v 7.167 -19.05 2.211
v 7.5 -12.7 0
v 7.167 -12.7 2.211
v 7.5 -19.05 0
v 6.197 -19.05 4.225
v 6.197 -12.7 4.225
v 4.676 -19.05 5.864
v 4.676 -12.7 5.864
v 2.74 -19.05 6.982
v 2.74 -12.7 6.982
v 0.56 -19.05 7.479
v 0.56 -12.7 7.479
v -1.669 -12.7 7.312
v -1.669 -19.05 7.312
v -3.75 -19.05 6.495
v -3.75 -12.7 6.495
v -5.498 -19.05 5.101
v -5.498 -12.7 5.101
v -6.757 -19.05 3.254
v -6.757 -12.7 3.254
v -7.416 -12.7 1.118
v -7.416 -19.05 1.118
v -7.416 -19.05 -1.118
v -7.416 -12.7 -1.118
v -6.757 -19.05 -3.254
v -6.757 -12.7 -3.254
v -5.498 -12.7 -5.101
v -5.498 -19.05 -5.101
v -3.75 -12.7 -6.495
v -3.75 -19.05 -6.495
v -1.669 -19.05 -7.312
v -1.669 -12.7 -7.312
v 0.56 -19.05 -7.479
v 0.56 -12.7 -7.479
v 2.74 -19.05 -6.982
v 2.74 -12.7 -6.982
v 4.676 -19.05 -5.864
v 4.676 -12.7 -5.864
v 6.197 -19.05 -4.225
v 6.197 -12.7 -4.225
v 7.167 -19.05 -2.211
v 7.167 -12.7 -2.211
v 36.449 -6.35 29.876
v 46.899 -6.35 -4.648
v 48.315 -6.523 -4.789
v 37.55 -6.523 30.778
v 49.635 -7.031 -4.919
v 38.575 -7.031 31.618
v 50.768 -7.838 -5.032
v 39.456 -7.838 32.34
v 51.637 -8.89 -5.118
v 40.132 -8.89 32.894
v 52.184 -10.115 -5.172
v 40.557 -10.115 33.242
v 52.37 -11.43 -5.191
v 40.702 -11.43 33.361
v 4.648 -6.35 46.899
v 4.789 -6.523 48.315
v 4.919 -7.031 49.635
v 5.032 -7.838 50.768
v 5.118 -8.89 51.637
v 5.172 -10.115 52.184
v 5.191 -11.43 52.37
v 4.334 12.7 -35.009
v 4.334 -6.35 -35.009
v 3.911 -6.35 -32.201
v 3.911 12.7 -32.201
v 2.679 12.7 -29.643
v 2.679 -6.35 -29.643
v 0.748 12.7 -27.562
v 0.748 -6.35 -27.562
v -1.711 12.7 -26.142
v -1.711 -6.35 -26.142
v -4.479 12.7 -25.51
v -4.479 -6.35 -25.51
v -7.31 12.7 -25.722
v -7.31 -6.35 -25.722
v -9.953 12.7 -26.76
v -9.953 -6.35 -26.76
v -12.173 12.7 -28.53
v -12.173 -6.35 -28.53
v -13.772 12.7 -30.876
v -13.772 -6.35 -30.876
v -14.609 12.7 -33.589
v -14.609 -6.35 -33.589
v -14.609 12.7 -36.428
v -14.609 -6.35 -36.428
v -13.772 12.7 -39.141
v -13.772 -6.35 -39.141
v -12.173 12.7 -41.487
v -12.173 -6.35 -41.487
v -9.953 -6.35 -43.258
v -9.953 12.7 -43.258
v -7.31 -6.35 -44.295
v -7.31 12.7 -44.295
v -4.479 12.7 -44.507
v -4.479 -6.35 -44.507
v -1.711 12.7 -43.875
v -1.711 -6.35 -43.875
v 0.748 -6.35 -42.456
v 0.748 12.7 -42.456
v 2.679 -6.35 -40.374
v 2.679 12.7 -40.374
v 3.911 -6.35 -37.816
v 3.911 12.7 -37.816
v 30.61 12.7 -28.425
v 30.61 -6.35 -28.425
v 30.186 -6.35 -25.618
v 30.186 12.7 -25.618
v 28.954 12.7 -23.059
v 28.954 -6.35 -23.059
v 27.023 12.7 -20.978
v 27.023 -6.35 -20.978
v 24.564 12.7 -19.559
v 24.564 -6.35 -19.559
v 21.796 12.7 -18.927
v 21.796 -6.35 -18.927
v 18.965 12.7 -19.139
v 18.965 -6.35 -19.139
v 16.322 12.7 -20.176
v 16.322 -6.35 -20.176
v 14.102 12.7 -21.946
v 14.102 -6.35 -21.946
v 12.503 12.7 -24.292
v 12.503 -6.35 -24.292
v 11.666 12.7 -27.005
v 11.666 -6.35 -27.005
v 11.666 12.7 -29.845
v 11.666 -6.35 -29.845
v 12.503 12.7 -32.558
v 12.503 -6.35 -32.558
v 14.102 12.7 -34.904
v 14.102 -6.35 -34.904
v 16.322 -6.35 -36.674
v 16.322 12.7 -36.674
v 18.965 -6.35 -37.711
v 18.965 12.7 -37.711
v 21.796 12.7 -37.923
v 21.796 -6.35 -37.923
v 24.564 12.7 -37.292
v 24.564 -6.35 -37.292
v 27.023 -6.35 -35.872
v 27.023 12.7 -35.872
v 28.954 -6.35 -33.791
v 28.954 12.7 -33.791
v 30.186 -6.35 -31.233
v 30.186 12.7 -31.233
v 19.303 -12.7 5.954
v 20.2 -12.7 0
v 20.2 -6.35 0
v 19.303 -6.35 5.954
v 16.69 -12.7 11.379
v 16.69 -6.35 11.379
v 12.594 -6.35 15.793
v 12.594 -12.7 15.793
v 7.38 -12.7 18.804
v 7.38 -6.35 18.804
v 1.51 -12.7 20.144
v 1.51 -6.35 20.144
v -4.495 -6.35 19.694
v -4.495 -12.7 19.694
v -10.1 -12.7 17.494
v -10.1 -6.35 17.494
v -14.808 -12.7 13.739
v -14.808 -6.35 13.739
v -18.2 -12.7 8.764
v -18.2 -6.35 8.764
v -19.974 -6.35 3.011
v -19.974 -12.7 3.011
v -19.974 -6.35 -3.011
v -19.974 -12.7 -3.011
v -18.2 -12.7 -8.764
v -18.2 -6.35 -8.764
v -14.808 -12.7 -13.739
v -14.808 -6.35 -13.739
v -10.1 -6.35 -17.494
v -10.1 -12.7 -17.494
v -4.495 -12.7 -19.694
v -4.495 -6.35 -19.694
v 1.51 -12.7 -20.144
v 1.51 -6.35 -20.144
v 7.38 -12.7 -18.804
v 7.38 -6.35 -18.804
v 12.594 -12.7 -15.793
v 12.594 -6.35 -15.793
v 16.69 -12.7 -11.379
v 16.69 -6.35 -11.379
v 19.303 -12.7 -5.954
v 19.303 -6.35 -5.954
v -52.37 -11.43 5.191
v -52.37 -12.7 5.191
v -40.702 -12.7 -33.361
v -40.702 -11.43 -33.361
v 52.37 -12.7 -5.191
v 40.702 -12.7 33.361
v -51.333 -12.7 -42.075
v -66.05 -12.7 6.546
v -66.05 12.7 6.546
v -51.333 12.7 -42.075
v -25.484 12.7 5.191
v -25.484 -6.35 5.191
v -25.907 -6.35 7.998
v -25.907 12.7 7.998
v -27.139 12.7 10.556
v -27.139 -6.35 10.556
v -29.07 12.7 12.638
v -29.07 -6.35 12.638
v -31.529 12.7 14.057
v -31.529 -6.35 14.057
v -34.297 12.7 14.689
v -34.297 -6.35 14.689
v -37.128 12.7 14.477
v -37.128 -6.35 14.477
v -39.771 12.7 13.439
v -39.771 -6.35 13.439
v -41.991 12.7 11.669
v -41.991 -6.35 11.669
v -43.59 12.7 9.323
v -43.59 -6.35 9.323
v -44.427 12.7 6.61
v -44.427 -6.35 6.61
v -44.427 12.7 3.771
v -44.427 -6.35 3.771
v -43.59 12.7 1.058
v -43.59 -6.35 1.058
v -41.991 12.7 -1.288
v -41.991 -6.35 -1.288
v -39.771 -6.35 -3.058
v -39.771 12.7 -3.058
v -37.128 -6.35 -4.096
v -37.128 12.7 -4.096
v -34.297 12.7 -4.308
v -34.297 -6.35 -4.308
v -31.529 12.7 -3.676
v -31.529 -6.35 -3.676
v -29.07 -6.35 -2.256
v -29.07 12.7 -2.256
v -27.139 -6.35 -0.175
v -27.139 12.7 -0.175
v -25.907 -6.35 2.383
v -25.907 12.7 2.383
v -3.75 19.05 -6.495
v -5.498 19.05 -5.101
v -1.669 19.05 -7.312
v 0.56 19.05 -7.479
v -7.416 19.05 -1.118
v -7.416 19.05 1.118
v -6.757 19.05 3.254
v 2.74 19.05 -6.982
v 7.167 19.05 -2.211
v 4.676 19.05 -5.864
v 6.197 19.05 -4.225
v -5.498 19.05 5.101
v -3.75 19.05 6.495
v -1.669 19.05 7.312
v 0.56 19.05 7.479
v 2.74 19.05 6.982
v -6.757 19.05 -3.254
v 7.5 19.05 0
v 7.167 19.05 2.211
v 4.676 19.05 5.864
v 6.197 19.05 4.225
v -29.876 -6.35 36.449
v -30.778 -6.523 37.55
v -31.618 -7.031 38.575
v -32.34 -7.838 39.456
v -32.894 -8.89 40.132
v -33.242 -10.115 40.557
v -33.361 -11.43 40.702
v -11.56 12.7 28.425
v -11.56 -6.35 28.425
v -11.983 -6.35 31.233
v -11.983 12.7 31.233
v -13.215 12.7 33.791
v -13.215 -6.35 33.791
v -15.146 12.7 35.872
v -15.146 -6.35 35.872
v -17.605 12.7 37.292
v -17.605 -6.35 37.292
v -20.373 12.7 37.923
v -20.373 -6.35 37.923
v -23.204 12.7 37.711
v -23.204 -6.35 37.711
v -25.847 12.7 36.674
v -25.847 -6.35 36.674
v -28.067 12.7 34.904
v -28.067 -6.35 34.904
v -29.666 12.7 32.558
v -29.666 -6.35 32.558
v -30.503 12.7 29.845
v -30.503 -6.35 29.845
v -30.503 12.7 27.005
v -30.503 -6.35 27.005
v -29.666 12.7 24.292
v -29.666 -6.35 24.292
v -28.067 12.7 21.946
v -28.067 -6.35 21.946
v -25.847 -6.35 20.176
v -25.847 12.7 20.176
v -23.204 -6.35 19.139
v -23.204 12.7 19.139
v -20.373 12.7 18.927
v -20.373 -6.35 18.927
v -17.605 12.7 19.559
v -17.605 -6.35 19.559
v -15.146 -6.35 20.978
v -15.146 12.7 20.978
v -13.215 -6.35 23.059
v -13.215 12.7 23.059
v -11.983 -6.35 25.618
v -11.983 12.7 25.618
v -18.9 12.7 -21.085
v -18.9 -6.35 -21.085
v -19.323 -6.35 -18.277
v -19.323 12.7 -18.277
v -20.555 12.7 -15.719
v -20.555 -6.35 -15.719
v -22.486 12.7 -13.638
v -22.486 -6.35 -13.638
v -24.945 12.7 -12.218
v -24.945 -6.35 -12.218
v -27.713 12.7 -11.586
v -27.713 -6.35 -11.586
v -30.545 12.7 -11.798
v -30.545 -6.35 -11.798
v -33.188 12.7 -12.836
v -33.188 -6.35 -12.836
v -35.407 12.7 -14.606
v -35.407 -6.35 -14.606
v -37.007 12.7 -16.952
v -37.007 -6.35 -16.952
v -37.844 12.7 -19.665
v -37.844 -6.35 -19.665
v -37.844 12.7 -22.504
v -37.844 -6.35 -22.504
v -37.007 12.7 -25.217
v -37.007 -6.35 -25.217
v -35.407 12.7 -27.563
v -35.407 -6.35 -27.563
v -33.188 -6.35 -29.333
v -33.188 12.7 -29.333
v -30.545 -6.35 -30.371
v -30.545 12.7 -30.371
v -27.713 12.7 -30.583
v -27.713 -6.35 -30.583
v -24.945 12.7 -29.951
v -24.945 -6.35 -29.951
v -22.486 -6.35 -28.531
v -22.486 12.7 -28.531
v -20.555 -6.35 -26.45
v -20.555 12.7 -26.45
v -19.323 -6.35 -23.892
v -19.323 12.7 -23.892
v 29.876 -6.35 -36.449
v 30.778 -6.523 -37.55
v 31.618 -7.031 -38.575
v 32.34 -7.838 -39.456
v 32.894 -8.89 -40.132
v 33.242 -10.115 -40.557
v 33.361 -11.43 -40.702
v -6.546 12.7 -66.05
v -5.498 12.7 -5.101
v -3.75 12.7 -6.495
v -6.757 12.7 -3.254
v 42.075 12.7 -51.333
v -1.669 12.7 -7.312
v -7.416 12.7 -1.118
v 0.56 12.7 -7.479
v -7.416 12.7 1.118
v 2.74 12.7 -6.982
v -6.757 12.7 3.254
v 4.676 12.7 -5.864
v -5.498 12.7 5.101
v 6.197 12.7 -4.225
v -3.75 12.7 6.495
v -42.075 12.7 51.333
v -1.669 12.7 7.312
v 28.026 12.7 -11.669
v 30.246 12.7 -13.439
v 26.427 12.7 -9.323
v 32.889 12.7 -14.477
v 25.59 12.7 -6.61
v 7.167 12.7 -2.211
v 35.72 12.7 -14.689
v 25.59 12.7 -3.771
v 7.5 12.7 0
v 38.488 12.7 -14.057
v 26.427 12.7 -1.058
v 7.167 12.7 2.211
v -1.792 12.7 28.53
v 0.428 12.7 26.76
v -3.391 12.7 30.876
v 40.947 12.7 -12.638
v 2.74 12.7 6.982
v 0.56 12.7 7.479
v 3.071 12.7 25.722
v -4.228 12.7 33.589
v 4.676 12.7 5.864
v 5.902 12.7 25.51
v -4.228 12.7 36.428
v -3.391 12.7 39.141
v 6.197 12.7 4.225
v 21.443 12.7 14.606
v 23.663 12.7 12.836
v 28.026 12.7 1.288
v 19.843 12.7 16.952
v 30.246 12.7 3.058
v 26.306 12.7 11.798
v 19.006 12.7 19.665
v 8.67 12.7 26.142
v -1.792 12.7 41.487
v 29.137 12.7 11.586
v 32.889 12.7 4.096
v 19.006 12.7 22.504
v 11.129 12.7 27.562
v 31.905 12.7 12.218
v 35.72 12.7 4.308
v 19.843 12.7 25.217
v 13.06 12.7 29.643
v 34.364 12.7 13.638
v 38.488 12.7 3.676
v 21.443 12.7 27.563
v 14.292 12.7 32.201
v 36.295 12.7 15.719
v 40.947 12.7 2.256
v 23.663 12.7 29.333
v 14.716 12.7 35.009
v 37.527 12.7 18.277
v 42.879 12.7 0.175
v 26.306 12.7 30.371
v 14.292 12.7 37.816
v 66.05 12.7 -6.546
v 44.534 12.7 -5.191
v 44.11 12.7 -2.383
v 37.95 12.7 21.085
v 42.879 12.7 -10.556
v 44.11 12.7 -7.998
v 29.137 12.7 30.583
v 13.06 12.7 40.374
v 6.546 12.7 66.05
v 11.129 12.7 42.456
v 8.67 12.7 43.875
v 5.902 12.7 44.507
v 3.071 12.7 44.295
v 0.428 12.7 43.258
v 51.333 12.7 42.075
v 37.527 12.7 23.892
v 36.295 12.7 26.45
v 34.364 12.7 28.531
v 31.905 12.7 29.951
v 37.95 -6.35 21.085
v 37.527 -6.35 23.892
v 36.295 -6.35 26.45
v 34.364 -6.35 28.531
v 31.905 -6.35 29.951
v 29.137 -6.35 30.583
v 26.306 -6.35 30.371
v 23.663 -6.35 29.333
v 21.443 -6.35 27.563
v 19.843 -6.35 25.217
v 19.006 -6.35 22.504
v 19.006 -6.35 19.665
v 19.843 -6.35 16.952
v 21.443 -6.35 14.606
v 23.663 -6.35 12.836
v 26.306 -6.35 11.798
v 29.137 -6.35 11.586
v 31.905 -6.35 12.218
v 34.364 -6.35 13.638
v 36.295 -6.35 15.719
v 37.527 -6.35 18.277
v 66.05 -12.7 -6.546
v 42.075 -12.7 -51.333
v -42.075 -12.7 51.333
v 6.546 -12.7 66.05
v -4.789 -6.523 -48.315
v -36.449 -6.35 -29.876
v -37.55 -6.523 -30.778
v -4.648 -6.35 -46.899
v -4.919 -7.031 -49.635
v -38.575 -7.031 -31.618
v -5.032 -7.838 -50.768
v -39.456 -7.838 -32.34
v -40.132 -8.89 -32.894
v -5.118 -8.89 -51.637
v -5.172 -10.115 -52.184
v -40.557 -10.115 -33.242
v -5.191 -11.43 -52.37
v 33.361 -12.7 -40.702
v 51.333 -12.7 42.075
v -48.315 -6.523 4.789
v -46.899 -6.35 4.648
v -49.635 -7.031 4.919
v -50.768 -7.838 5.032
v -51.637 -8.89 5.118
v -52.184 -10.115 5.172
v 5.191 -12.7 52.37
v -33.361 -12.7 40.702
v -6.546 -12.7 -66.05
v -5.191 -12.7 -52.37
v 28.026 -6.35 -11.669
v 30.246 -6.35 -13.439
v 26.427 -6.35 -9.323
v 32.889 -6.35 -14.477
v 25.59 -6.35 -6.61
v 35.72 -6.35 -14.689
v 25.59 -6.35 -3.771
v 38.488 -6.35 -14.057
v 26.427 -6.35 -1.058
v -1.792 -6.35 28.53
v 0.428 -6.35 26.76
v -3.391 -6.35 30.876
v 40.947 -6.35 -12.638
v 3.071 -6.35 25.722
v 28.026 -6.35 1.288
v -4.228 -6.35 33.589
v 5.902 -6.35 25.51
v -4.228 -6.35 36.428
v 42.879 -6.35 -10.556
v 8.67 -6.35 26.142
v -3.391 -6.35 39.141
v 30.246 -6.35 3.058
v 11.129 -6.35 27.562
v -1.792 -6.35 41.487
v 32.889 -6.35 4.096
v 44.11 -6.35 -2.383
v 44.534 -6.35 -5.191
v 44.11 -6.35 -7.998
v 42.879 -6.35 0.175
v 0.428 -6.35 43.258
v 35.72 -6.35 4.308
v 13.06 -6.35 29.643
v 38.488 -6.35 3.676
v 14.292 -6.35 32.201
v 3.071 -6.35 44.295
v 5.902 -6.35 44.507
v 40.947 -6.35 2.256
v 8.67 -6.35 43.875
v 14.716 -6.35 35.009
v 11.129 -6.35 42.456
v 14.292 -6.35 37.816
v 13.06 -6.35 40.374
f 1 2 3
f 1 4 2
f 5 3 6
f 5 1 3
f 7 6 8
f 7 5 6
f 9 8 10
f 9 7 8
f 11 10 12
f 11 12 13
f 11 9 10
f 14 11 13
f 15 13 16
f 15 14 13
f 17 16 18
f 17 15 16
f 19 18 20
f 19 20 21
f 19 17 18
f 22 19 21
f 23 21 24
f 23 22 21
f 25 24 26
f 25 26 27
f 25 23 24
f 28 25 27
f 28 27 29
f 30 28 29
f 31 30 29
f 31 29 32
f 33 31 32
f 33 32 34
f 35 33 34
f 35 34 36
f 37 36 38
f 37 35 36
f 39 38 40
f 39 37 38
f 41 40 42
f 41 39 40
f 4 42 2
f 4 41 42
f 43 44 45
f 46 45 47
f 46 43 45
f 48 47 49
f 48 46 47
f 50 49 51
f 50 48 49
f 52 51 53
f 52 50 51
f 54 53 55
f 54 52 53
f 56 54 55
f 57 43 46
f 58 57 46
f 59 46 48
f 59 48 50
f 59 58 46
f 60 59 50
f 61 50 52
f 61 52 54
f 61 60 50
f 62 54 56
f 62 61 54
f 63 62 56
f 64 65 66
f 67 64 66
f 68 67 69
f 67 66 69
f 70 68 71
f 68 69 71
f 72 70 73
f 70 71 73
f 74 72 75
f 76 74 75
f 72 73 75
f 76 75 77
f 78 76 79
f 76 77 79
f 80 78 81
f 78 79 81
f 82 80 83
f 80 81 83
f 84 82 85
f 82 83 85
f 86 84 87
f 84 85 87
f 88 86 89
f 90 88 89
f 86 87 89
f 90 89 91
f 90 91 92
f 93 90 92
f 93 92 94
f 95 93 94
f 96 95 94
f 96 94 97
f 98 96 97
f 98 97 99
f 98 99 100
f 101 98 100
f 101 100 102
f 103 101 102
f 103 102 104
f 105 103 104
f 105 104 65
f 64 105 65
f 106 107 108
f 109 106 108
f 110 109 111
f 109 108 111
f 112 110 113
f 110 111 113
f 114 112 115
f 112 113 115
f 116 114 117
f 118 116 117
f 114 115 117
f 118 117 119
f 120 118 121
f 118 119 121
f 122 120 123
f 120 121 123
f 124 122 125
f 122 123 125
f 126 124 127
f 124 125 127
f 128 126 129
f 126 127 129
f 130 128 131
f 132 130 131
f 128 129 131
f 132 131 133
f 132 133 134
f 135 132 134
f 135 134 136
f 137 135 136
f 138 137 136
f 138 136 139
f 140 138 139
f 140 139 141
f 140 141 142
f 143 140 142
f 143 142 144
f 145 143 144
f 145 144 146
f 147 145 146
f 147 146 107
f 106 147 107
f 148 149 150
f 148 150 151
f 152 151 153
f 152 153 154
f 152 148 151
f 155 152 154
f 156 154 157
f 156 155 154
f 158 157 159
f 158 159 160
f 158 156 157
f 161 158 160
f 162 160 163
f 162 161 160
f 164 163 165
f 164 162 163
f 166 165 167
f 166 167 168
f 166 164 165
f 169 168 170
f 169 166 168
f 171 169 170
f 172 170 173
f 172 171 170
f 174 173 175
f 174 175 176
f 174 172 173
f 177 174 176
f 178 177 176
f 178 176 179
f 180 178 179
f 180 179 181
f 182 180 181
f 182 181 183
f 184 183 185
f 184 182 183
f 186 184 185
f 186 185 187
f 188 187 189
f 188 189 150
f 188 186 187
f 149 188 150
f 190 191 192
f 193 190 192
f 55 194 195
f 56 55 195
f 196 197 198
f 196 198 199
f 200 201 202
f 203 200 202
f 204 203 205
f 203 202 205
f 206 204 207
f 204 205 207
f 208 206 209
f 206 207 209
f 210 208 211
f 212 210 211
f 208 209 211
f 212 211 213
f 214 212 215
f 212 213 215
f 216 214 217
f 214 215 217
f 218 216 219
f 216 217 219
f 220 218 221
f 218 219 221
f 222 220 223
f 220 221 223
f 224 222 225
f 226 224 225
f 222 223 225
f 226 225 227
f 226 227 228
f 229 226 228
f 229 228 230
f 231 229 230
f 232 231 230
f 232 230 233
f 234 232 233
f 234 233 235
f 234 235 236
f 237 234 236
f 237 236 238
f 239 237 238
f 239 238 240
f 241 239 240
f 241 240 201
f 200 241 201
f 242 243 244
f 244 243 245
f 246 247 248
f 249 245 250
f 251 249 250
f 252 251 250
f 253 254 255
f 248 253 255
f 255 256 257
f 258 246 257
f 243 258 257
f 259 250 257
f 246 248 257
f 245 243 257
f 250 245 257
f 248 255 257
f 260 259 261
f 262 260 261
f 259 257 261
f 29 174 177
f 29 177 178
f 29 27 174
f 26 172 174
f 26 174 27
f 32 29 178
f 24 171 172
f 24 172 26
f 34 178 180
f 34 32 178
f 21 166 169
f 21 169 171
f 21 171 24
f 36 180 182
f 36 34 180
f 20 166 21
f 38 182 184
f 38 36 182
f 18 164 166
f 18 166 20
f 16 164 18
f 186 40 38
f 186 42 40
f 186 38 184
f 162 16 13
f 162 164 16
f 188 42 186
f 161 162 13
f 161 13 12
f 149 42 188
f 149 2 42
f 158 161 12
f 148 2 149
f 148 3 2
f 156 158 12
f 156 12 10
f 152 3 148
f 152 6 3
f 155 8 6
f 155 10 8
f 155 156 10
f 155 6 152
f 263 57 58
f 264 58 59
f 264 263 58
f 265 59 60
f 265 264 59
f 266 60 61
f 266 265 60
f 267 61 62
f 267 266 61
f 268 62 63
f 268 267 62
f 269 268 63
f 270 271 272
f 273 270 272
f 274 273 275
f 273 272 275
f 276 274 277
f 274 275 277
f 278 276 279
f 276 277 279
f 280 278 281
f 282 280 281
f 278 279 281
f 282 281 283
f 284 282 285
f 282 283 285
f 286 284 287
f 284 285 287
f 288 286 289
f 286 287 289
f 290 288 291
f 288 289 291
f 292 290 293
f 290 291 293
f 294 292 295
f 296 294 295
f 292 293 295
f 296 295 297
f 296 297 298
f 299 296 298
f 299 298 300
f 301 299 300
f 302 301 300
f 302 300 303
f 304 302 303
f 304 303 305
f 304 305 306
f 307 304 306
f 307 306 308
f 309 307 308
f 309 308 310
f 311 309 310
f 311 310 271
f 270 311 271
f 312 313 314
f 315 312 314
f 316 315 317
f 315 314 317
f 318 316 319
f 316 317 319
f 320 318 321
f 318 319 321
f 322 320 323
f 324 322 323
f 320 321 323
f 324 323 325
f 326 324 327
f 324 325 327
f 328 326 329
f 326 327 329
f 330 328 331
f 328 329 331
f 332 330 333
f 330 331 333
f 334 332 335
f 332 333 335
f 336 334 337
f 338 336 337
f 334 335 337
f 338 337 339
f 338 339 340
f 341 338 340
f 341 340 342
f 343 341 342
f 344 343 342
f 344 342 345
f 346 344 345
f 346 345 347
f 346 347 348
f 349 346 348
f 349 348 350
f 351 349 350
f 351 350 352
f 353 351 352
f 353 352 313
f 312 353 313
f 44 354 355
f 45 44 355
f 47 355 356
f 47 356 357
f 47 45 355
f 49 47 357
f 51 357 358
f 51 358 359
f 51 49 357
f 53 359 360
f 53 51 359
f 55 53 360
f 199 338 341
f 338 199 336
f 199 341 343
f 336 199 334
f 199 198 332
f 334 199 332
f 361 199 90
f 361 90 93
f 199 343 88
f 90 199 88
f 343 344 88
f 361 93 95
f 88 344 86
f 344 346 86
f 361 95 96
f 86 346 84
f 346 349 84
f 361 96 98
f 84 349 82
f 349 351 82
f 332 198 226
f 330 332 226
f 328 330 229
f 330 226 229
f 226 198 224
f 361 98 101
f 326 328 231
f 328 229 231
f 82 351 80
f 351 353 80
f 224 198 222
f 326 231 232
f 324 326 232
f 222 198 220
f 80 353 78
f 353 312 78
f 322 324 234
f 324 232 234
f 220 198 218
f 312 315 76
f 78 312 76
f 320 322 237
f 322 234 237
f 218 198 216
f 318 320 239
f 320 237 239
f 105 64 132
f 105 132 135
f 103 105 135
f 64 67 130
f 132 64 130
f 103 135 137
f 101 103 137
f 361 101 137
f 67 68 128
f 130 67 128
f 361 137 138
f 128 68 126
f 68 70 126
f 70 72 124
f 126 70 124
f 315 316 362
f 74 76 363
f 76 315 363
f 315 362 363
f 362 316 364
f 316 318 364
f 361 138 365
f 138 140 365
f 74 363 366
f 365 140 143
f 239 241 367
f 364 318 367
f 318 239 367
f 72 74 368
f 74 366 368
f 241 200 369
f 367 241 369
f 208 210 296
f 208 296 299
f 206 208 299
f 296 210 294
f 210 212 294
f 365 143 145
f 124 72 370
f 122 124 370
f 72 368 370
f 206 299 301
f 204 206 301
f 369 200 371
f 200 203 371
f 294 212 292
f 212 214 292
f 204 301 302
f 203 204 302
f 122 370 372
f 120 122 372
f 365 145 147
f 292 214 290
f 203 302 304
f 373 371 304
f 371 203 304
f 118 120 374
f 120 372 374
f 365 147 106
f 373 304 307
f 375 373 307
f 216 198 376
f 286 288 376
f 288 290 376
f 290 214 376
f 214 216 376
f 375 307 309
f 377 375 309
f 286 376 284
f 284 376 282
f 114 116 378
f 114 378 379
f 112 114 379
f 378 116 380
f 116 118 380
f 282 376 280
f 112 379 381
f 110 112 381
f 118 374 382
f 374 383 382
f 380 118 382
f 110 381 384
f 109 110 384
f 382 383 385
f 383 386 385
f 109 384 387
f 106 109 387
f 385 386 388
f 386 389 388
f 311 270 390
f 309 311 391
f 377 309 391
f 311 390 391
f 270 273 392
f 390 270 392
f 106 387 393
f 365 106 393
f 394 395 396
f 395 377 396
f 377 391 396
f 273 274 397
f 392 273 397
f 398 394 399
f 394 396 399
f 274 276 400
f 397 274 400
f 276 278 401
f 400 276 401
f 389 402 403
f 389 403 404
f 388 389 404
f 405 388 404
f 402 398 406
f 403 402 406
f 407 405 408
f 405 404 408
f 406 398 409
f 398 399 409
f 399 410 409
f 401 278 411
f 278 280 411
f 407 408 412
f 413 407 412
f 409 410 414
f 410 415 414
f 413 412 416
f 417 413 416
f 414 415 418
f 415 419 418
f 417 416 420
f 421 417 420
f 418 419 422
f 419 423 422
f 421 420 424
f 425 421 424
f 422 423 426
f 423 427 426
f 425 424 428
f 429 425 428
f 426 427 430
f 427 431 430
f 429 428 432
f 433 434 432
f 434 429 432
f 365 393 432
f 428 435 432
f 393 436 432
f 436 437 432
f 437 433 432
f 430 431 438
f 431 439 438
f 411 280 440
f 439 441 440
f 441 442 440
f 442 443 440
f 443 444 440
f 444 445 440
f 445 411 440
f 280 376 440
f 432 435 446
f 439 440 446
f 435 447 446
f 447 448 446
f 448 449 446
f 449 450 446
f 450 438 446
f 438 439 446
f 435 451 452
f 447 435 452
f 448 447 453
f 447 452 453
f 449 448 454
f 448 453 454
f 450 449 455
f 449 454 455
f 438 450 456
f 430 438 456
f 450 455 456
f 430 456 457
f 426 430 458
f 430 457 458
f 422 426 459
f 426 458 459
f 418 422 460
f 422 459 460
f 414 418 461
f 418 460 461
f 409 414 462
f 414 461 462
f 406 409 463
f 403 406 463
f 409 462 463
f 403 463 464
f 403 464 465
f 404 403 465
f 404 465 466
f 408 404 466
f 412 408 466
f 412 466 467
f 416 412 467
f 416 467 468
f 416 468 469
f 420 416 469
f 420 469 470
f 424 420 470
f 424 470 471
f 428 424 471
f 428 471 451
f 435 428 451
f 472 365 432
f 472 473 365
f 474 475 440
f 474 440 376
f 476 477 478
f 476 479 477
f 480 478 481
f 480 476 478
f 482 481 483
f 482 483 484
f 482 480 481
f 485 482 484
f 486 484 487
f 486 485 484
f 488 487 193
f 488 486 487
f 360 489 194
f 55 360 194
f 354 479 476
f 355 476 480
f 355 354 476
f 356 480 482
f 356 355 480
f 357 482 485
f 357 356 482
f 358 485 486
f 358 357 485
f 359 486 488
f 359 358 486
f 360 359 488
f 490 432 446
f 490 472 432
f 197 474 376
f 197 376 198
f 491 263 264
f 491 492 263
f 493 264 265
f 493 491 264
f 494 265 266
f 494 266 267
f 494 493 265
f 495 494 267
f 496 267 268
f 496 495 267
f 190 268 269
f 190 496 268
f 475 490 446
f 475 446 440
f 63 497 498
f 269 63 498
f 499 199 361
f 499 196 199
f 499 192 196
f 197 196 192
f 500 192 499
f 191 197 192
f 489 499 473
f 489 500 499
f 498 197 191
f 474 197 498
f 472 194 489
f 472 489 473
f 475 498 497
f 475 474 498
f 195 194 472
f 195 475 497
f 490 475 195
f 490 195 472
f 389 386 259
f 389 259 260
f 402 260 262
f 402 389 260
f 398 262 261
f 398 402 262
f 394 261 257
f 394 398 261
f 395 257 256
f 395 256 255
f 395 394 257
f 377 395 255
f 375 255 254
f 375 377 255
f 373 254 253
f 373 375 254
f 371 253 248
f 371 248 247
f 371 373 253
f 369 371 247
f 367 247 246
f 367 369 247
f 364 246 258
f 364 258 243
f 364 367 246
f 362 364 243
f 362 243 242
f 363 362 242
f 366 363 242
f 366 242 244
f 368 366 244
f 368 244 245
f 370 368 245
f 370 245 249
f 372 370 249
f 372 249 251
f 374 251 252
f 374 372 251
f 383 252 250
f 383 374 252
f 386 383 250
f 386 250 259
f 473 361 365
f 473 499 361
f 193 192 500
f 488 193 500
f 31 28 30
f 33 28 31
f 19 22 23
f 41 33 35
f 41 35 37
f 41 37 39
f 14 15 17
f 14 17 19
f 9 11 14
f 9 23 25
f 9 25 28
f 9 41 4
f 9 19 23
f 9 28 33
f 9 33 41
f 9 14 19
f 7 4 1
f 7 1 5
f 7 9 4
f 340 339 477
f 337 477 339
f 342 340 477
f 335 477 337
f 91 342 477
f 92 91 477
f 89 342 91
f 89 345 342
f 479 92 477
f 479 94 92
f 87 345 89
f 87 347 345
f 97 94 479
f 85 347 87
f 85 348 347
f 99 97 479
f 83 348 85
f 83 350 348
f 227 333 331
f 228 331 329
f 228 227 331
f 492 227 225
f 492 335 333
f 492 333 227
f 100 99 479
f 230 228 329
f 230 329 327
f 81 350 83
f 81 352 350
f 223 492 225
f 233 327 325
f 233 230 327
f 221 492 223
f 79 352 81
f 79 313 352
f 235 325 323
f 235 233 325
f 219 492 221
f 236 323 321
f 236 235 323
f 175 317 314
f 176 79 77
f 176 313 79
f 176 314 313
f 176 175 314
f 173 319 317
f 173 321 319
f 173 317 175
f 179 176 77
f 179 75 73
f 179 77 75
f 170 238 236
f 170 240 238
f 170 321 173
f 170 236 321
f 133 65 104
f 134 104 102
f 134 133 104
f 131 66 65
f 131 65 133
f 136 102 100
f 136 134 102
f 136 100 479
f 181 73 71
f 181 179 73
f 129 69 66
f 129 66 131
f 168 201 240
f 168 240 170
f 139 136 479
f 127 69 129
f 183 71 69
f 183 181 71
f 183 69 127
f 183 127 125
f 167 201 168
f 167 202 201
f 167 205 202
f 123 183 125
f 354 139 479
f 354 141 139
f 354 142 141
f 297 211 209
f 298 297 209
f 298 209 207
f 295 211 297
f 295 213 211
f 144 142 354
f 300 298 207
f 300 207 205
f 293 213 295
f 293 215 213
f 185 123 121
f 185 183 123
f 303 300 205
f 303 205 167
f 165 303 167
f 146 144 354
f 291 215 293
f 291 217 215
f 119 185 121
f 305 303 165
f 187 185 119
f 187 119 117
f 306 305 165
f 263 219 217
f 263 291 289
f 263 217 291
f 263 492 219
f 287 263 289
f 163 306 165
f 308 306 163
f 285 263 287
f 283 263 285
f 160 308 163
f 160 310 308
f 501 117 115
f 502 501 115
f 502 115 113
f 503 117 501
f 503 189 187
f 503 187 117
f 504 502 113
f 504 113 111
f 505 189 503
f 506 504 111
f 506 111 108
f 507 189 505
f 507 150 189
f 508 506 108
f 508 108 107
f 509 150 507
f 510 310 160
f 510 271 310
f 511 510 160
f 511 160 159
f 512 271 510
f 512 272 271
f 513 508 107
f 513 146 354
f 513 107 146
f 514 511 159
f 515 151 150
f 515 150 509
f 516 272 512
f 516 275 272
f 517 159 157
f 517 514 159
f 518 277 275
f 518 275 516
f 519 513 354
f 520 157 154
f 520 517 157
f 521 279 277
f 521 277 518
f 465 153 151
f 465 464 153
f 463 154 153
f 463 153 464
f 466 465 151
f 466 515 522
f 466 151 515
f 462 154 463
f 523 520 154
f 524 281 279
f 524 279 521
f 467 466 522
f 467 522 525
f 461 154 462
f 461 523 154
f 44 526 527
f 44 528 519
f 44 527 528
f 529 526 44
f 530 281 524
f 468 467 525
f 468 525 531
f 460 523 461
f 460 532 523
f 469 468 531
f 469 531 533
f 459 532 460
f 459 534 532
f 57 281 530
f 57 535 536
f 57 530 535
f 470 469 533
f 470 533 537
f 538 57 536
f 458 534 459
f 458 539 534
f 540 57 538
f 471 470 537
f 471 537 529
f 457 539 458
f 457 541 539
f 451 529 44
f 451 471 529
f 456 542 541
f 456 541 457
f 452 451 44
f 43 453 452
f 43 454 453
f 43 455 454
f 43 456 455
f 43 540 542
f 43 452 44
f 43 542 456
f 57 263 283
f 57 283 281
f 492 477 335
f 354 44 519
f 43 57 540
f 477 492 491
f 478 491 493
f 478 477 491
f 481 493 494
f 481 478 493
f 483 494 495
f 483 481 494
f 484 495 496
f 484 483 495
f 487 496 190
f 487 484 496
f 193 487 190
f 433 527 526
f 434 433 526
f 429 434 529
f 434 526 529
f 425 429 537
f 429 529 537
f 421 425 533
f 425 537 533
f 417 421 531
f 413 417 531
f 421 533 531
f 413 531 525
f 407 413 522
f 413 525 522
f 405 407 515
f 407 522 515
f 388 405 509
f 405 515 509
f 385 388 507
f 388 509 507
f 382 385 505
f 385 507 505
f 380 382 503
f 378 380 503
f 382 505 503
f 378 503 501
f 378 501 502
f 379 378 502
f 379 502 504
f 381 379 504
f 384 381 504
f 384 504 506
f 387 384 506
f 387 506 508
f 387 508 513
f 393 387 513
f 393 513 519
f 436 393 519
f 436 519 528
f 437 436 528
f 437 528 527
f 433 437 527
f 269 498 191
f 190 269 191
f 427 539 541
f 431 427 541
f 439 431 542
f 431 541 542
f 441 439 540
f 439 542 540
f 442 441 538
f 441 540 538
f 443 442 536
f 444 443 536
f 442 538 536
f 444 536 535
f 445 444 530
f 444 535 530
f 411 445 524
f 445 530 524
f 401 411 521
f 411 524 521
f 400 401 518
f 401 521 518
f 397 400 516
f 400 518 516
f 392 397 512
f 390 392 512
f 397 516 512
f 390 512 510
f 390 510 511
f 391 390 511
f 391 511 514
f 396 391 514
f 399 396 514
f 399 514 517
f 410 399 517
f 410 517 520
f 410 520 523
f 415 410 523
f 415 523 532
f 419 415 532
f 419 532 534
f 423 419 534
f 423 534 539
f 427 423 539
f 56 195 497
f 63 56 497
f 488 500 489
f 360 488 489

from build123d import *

# Parameters (mm, degrees)
F0_R     = 7.5
F1_DEPTH = 12.7
F2_DEPTH = 19.05
F3_R     = 9.525
F3_R_2   = 20.2
F4_DEPTH = 6.35
F5_DEPTH = 31.751
F6_R     = 5.08


with BuildPart() as f1:
    # F0 (on Front) → F1 (new body, symmetric)
    with BuildSketch(Plane.XZ):
        Polygon((66.049778, -6.546358), (51.333221, 42.075272), (6.546358, 66.049778), (-42.075272, 51.333221), (-66.049778, 6.546358), (-51.333221, -42.075272), (-6.546358, -66.049778), (42.075272, -51.333221), align=None)
        Circle(F0_R, mode=Mode.SUBTRACT)
    extrude(amount=F1_DEPTH, both=True)

    # F0 (on Front) → F2 (join, symmetric)
    with BuildSketch(Plane.XZ):
        Circle(F0_R)
    extrude(amount=F2_DEPTH, both=True)

    # F3 (on face) → F4 (cut)
    with BuildSketch(Plane.XZ.offset(12.7)):
        Polygon((-5.190563, -52.370421), (33.361198, -40.701763), (52.370421, -5.190563), (40.701763, 33.361198), (5.190563, 52.370421), (-33.361198, 40.701763), (-52.370421, 5.190563), (-40.701763, -33.361198), align=None)
        with Locations((-5.190563, -35.008609)):
            Circle(F3_R, mode=Mode.SUBTRACT)
        with Locations((-28.425107, -21.084543)):
            Circle(F3_R, mode=Mode.SUBTRACT)
        with Locations((21.084543, -28.425107)):
            Circle(F3_R, mode=Mode.SUBTRACT)
        Circle(F3_R_2, mode=Mode.SUBTRACT)
        with Locations((35.008609, -5.190563)):
            Circle(F3_R, mode=Mode.SUBTRACT)
        with Locations((-35.008609, 5.190563)):
            Circle(F3_R, mode=Mode.SUBTRACT)
        with Locations((-21.084543, 28.425107)):
            Circle(F3_R, mode=Mode.SUBTRACT)
        with Locations((28.425107, 21.084543)):
            Circle(F3_R, mode=Mode.SUBTRACT)
        with Locations((5.190563, 35.008609)):
            Circle(F3_R, mode=Mode.SUBTRACT)
    extrude(amount=-F4_DEPTH, mode=Mode.SUBTRACT)

    # F3 (on face) → F5 (cut, through all)
    with BuildSketch(Plane.XZ.offset(12.7)):
        with Locations((-35.008609, 5.190563)):
            Circle(F3_R)
        with Locations((-21.084543, 28.425107)):
            Circle(F3_R)
        with Locations((5.190563, 35.008609)):
            Circle(F3_R)
        with Locations((28.425107, 21.084543)):
            Circle(F3_R)
        with Locations((21.084543, -28.425107)):
            Circle(F3_R)
        with Locations((-28.425107, -21.084543)):
            Circle(F3_R)
        with Locations((35.008609, -5.190563)):
            Circle(F3_R)
        with Locations((-5.190563, -35.008609)):
            Circle(F3_R)
    extrude(amount=-F5_DEPTH, mode=Mode.SUBTRACT)

    # F6
    f6_edges = [f1.edges().sort_by_distance(p)[0] for p in [
        (-14.085317, -6.35, 46.536092),
        (-42.86581, -6.35, 22.946163),
        (-46.536092, -6.35, -14.085317),
        (-22.946163, -6.35, -42.86581),
        (22.946163, -6.35, 42.86581),
        (46.536092, -6.35, 14.085317),
        (42.86581, -6.35, -22.946163),
        (14.085317, -6.35, -46.536092),
    ]]
    fillet(f6_edges, radius=F6_R)


solid = f1.part
